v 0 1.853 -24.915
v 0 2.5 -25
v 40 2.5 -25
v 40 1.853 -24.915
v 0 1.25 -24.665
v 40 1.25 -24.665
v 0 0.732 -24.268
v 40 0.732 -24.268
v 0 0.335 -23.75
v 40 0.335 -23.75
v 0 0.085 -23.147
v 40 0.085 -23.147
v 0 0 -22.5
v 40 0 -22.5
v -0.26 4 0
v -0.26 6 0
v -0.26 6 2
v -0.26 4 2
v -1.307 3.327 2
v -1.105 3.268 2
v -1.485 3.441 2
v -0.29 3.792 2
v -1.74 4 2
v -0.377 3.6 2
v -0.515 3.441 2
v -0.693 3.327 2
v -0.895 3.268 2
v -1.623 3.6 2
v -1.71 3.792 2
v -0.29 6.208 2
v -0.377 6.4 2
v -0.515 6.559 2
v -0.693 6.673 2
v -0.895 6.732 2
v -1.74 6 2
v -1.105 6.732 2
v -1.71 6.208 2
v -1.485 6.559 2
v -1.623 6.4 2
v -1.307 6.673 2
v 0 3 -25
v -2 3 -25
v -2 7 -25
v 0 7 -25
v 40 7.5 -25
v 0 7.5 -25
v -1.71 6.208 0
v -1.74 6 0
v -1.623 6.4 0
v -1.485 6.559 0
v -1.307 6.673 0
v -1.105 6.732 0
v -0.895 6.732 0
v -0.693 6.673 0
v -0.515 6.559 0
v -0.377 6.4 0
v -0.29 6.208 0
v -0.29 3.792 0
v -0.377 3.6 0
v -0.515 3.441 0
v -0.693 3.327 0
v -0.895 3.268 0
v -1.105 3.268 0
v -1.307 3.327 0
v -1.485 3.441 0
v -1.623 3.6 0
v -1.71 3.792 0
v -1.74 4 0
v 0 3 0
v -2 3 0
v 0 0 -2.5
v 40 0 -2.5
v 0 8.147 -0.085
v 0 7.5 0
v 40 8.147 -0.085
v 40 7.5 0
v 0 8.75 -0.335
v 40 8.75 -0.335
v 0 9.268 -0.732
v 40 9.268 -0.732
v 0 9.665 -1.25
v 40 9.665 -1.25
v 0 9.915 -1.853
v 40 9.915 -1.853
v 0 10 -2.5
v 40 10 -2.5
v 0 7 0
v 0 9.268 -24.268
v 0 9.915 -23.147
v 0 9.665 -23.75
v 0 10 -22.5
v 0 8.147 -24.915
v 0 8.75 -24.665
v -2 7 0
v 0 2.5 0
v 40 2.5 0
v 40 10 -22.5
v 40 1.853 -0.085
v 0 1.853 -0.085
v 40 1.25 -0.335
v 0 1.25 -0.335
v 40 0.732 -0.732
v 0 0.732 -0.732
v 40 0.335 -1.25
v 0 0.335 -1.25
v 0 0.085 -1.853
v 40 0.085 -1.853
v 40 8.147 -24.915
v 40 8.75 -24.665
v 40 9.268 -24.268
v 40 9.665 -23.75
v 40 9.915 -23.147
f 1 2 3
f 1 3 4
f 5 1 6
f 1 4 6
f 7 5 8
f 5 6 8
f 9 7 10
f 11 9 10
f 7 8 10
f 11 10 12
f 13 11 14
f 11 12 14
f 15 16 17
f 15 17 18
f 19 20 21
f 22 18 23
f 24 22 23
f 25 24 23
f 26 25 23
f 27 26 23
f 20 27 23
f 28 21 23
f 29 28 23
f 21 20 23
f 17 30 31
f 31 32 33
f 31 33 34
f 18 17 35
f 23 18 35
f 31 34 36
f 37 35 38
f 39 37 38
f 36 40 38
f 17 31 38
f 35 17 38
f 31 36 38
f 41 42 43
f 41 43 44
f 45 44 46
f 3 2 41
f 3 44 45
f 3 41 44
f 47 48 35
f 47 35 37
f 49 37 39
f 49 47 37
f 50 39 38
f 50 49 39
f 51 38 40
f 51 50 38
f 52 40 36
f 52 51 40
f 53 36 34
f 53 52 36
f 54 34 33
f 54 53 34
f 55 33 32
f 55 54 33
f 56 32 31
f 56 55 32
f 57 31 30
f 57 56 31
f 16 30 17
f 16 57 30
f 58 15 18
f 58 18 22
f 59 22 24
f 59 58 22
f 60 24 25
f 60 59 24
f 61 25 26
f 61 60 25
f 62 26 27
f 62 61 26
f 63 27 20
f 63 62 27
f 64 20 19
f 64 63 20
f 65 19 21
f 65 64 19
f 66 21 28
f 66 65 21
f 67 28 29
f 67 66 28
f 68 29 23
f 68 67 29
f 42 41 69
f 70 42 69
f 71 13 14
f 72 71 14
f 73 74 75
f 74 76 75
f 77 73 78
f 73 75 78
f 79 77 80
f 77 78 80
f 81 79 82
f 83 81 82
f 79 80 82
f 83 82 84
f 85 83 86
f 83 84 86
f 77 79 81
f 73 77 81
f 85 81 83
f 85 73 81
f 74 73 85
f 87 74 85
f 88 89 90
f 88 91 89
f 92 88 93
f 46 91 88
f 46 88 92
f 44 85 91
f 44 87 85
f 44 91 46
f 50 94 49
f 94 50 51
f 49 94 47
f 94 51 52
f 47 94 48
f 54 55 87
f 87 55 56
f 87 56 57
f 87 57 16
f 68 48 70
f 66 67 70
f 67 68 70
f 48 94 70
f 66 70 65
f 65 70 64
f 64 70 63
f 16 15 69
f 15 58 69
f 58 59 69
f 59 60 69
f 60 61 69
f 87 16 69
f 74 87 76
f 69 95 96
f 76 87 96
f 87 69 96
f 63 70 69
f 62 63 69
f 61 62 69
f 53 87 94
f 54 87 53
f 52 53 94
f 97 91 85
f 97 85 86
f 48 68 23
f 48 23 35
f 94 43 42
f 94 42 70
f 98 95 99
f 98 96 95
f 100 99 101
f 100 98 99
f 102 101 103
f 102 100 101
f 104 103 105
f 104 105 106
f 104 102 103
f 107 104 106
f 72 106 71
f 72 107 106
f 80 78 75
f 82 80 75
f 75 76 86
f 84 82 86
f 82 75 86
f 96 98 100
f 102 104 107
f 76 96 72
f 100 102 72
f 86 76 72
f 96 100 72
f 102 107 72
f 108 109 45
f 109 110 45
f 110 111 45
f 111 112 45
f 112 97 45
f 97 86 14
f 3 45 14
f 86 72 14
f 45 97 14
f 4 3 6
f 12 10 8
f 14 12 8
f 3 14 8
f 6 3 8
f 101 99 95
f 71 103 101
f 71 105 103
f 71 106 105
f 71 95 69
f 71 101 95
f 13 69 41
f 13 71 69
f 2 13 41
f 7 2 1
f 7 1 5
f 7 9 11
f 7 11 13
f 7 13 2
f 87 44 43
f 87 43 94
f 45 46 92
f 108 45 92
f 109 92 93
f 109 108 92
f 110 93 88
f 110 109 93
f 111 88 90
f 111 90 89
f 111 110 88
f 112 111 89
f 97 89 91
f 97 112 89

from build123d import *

# Parameters (mm, degrees)
SKETCH_1_W      = 40
SKETCH_1_H      = 25
EXTRUDE_1_DEPTH = 10
FILLET_1_R      = 2.5
SKETCH_2_W      = 25
SKETCH_2_H      = 4
EXTRUDE_2_DEPTH = 2
EXTRUDE_3_DEPTH = 2


with BuildPart() as part:
    # 草图1 → 凸台-拉伸1 (new body)
    with BuildSketch(Plane(origin=(0, 0, 0), x_dir=(1, 0, 0), z_dir=(0, 1, 0))):
        with Locations((20, 12.5)):
            Rectangle(SKETCH_1_W, SKETCH_1_H)
    extrude(amount=EXTRUDE_1_DEPTH)

    # 圆角1
    fillet_1_edges = [part.edges().sort_by_distance(p)[0] for p in [
        (20, 10, -25),
        (20, 0, -25),
        (20, 0, 0),
        (20, 10, 0),
    ]]
    fillet(fillet_1_edges, radius=FILLET_1_R)

    # 草图2 → 凸台-拉伸2 (add)
    with BuildSketch(Plane.ZY):
        with Locations((-12.5, 5)):
            Rectangle(SKETCH_2_W, SKETCH_2_H)
    extrude(amount=EXTRUDE_2_DEPTH)

    # 草图3 → 凸台-拉伸3 (add)
    with BuildSketch(Plane.XY):
        with BuildLine():
            Line((-0.26, 6), (-0.26, 4))
            ThreePointArc((-0.26, 4), (-1, 3.26), (-1.74, 4))
            Line((-1.74, 4), (-1.74, 6))
            ThreePointArc((-1.74, 6), (-1, 6.74), (-0.26, 6))
        make_face()
    extrude(amount=EXTRUDE_3_DEPTH)


solid = part.part
